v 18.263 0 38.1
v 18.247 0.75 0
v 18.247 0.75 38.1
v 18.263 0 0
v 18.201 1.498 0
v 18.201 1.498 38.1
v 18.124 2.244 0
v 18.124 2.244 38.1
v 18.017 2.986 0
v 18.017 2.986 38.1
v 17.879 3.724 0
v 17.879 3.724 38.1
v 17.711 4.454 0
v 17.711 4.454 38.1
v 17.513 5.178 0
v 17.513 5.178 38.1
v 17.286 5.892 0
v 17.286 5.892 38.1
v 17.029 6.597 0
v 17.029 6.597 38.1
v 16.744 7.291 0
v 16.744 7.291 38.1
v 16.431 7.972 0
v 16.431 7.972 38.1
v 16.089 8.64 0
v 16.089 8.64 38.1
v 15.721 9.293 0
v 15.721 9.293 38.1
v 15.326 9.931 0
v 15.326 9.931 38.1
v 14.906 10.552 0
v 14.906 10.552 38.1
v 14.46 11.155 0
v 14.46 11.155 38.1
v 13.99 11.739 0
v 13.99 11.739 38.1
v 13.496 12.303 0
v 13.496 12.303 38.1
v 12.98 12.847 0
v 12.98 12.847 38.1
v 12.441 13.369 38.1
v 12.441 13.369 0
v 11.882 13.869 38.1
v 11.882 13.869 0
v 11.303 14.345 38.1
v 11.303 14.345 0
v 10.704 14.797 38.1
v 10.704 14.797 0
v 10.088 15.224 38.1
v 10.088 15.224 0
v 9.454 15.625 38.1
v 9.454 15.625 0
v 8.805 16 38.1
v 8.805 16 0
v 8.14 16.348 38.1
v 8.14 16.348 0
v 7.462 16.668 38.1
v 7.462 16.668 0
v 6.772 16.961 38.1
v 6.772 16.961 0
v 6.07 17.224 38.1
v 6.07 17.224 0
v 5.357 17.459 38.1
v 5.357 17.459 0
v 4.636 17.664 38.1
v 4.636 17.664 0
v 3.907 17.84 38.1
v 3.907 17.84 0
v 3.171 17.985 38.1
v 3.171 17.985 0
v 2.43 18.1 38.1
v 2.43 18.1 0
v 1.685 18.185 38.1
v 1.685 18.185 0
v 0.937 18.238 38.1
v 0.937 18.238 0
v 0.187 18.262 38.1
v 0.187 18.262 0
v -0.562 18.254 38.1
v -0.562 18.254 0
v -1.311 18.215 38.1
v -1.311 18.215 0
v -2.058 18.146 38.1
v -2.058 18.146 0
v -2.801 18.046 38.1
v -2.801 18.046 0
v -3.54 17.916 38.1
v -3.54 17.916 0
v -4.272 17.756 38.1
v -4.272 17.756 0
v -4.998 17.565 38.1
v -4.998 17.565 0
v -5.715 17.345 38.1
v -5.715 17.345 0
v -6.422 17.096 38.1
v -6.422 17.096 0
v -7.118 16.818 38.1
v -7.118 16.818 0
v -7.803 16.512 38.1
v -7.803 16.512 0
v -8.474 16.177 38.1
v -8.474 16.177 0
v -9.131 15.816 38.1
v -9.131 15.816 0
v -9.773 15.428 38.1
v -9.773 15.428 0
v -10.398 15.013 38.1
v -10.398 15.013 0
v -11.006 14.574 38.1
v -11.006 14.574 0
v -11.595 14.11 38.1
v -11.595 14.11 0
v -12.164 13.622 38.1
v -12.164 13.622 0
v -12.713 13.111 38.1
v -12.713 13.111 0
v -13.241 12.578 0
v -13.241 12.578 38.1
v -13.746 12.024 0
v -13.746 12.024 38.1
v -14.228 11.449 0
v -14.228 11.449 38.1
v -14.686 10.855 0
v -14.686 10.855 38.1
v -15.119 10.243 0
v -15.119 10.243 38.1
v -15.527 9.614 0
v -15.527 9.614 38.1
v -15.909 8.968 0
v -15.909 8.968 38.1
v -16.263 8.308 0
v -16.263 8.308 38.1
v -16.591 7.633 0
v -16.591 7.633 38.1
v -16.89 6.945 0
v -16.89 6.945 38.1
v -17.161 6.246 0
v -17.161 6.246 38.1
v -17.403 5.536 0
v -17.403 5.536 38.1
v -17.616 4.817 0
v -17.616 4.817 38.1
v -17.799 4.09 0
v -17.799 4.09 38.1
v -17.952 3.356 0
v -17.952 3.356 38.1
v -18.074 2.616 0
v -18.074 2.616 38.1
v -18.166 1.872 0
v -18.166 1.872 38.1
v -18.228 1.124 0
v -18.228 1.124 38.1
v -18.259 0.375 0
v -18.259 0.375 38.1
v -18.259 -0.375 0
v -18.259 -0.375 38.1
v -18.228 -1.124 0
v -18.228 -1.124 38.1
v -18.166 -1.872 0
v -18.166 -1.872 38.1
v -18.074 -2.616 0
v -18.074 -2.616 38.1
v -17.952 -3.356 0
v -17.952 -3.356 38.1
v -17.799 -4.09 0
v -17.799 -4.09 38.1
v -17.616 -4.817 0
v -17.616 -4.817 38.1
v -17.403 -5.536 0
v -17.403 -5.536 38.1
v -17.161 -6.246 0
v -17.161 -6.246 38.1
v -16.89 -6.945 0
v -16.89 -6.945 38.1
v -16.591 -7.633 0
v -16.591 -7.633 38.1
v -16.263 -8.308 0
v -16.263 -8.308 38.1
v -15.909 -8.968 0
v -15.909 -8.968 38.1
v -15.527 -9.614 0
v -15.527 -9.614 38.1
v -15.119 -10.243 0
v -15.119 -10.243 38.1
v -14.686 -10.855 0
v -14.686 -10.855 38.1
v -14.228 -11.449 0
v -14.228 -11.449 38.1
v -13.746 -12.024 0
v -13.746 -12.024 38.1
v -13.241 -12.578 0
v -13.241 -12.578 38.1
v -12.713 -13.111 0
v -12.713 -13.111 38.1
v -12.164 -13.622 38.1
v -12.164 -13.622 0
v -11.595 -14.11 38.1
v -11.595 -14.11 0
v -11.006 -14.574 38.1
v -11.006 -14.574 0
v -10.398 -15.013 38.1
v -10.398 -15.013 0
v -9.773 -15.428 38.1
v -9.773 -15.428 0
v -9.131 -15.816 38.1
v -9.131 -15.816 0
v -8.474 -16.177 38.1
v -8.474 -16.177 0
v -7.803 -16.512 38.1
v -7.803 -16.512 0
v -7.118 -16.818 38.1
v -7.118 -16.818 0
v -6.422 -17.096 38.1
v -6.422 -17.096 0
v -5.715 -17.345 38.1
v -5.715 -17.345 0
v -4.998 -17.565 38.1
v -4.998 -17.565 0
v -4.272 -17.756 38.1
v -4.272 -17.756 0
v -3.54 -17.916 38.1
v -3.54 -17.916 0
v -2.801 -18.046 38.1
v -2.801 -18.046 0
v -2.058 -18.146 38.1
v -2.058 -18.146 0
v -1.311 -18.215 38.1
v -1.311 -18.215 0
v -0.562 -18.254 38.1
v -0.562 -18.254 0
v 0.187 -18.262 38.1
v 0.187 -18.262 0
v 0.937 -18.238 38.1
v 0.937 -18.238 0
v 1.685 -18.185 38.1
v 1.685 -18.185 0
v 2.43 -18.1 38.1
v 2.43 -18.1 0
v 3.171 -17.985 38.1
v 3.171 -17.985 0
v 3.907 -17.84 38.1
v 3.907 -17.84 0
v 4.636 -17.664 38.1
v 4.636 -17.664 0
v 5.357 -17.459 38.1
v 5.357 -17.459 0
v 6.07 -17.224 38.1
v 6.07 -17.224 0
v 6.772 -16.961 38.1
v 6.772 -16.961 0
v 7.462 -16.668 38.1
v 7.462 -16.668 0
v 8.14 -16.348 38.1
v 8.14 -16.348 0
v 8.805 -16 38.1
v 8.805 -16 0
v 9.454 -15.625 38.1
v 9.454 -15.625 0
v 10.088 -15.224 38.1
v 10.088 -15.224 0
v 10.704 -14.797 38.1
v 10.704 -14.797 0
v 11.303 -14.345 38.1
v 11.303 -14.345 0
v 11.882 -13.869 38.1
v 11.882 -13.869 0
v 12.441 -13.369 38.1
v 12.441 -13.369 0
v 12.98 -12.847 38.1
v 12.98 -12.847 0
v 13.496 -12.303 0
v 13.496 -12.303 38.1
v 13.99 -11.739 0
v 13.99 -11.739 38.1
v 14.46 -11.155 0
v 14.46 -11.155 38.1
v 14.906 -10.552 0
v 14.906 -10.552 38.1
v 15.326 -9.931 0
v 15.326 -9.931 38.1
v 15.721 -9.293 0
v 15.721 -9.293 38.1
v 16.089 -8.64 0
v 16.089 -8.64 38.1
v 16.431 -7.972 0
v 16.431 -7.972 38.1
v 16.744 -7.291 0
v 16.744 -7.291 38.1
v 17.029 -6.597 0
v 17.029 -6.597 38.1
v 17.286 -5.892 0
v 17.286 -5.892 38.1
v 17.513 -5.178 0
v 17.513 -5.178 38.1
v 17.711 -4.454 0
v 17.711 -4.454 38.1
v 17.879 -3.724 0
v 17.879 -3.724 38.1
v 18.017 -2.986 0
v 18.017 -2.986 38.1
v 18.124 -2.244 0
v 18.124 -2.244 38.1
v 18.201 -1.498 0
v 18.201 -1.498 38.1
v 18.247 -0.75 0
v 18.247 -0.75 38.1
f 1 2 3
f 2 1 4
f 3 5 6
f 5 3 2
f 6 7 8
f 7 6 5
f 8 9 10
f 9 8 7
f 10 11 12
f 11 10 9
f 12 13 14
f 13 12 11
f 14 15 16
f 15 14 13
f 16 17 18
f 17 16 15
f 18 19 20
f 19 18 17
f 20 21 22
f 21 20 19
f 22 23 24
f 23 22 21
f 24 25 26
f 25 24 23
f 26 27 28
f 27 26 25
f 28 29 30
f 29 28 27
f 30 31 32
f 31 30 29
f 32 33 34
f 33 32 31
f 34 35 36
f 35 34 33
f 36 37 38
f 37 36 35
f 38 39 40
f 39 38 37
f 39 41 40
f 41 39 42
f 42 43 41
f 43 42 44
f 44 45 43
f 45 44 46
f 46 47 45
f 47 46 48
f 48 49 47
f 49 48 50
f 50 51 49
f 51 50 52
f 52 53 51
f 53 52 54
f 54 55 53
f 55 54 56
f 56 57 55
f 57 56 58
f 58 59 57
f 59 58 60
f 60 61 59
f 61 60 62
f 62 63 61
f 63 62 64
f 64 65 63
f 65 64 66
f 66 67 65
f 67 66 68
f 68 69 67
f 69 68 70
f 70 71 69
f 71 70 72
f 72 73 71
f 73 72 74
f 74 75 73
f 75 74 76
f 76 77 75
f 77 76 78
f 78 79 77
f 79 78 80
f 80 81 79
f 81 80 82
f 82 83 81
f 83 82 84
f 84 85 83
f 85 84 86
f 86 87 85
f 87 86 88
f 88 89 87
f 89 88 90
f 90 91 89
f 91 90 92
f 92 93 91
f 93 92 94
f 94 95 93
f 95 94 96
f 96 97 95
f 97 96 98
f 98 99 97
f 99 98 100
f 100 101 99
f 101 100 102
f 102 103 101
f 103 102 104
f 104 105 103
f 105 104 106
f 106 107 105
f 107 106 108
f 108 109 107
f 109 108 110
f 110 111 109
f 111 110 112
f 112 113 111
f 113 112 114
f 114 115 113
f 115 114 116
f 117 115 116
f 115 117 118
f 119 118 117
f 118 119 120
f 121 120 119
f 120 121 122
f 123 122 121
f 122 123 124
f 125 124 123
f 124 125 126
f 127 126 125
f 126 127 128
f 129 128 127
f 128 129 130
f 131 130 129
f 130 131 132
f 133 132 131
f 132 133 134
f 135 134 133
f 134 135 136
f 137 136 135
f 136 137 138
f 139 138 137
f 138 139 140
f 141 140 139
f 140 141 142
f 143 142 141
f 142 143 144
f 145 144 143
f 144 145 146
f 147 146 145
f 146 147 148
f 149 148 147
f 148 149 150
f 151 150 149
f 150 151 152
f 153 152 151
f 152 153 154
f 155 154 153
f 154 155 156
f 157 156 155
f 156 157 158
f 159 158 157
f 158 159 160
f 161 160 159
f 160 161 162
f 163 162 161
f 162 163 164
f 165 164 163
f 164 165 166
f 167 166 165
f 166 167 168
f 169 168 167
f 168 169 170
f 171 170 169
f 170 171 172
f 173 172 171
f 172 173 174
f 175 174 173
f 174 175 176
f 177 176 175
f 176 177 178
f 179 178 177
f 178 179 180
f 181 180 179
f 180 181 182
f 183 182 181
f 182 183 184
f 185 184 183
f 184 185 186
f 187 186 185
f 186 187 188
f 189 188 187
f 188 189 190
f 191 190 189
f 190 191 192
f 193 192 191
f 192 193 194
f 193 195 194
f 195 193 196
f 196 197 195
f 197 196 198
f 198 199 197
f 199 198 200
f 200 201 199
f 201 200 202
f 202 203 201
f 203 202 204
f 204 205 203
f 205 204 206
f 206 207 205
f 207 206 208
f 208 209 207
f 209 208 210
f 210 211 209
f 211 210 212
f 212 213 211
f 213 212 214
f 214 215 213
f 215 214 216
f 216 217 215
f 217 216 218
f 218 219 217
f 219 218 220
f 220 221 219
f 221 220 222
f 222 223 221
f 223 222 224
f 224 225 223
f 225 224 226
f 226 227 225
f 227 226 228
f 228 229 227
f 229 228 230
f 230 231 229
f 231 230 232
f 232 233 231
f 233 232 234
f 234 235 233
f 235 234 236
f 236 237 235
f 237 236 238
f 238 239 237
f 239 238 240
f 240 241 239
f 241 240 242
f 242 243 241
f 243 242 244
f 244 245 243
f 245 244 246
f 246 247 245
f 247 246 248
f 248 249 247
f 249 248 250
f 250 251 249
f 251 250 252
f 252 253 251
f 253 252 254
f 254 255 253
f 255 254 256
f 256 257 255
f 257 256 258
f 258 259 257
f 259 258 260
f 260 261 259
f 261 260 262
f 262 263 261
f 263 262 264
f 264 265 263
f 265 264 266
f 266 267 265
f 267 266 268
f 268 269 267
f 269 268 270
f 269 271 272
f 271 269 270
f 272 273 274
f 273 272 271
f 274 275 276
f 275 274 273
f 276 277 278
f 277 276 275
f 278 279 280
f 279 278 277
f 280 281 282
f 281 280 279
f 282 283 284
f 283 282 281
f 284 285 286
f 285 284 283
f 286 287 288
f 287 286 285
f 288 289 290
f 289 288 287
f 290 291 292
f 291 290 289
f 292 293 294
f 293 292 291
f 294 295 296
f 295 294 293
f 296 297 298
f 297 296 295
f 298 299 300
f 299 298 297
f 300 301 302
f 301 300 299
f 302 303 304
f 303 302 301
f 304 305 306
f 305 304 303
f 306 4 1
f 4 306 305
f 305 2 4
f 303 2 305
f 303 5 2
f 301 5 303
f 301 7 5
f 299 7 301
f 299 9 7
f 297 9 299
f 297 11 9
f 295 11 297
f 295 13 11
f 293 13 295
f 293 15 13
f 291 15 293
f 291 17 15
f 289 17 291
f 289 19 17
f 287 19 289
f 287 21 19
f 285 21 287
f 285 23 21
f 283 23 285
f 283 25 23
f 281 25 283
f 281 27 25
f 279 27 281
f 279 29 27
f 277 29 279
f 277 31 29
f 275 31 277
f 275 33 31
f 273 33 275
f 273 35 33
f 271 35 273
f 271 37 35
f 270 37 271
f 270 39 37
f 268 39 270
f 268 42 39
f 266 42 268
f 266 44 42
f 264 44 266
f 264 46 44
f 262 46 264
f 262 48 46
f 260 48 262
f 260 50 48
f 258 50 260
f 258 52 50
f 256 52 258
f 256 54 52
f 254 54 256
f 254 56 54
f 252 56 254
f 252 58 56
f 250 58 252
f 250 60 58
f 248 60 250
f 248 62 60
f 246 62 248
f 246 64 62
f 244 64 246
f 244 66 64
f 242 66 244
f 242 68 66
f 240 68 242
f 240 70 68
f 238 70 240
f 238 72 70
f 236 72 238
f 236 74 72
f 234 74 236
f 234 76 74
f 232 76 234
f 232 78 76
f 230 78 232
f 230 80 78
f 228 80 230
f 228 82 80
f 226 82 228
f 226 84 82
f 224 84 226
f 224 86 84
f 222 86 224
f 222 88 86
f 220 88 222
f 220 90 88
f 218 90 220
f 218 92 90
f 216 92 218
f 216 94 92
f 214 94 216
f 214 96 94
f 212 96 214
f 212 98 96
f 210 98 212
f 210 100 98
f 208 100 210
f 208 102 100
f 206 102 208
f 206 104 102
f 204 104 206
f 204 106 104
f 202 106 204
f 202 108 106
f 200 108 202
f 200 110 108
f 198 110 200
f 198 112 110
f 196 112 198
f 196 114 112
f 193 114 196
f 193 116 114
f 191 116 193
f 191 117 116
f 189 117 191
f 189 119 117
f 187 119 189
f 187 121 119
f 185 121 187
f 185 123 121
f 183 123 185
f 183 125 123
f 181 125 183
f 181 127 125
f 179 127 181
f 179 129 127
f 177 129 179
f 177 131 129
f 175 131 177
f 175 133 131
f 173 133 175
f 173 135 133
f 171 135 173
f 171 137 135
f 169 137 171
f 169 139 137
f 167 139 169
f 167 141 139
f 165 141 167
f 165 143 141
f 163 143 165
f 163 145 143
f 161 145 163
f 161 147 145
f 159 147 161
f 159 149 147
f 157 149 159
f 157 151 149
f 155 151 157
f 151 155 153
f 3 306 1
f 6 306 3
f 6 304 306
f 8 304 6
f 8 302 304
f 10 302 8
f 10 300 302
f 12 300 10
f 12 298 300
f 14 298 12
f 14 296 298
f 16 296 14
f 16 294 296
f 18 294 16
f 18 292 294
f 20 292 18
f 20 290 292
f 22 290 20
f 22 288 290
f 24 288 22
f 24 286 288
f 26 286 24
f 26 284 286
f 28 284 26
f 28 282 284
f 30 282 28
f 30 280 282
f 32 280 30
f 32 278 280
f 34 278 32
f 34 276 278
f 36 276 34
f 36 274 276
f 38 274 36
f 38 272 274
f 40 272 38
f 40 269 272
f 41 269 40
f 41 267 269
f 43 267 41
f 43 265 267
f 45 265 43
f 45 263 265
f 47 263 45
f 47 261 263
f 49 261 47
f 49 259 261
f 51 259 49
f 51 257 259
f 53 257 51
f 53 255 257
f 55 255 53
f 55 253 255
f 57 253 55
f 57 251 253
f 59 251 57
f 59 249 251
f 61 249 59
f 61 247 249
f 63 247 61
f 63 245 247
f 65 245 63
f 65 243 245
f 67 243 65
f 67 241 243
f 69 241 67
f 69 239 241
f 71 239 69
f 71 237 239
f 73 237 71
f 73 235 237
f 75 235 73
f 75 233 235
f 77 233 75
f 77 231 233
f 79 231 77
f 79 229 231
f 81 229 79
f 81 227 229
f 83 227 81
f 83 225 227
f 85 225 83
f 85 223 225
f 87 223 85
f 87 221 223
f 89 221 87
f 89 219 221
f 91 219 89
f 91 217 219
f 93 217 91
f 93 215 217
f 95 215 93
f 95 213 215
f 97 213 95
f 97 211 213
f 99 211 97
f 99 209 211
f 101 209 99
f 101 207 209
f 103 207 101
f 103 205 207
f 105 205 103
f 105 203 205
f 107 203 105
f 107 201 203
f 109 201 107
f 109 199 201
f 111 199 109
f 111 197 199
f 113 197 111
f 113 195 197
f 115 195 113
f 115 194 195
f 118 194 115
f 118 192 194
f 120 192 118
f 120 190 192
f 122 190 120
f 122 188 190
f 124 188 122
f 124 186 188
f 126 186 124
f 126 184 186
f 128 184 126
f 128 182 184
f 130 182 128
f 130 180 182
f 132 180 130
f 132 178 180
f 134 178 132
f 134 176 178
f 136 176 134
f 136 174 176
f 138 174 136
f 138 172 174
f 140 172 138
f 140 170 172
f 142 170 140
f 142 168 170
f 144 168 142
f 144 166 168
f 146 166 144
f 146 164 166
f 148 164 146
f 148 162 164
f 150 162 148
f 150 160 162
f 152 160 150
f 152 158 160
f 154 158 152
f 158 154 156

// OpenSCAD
$fa = $preview ? 15 : 1;
$fs = $preview ? 2 : 0.75;

// Under-sink light socket cover
cylinder(d=(1+3/8) * 25.4 + 0.8*2, h=(1+1/2) * 25.4);
